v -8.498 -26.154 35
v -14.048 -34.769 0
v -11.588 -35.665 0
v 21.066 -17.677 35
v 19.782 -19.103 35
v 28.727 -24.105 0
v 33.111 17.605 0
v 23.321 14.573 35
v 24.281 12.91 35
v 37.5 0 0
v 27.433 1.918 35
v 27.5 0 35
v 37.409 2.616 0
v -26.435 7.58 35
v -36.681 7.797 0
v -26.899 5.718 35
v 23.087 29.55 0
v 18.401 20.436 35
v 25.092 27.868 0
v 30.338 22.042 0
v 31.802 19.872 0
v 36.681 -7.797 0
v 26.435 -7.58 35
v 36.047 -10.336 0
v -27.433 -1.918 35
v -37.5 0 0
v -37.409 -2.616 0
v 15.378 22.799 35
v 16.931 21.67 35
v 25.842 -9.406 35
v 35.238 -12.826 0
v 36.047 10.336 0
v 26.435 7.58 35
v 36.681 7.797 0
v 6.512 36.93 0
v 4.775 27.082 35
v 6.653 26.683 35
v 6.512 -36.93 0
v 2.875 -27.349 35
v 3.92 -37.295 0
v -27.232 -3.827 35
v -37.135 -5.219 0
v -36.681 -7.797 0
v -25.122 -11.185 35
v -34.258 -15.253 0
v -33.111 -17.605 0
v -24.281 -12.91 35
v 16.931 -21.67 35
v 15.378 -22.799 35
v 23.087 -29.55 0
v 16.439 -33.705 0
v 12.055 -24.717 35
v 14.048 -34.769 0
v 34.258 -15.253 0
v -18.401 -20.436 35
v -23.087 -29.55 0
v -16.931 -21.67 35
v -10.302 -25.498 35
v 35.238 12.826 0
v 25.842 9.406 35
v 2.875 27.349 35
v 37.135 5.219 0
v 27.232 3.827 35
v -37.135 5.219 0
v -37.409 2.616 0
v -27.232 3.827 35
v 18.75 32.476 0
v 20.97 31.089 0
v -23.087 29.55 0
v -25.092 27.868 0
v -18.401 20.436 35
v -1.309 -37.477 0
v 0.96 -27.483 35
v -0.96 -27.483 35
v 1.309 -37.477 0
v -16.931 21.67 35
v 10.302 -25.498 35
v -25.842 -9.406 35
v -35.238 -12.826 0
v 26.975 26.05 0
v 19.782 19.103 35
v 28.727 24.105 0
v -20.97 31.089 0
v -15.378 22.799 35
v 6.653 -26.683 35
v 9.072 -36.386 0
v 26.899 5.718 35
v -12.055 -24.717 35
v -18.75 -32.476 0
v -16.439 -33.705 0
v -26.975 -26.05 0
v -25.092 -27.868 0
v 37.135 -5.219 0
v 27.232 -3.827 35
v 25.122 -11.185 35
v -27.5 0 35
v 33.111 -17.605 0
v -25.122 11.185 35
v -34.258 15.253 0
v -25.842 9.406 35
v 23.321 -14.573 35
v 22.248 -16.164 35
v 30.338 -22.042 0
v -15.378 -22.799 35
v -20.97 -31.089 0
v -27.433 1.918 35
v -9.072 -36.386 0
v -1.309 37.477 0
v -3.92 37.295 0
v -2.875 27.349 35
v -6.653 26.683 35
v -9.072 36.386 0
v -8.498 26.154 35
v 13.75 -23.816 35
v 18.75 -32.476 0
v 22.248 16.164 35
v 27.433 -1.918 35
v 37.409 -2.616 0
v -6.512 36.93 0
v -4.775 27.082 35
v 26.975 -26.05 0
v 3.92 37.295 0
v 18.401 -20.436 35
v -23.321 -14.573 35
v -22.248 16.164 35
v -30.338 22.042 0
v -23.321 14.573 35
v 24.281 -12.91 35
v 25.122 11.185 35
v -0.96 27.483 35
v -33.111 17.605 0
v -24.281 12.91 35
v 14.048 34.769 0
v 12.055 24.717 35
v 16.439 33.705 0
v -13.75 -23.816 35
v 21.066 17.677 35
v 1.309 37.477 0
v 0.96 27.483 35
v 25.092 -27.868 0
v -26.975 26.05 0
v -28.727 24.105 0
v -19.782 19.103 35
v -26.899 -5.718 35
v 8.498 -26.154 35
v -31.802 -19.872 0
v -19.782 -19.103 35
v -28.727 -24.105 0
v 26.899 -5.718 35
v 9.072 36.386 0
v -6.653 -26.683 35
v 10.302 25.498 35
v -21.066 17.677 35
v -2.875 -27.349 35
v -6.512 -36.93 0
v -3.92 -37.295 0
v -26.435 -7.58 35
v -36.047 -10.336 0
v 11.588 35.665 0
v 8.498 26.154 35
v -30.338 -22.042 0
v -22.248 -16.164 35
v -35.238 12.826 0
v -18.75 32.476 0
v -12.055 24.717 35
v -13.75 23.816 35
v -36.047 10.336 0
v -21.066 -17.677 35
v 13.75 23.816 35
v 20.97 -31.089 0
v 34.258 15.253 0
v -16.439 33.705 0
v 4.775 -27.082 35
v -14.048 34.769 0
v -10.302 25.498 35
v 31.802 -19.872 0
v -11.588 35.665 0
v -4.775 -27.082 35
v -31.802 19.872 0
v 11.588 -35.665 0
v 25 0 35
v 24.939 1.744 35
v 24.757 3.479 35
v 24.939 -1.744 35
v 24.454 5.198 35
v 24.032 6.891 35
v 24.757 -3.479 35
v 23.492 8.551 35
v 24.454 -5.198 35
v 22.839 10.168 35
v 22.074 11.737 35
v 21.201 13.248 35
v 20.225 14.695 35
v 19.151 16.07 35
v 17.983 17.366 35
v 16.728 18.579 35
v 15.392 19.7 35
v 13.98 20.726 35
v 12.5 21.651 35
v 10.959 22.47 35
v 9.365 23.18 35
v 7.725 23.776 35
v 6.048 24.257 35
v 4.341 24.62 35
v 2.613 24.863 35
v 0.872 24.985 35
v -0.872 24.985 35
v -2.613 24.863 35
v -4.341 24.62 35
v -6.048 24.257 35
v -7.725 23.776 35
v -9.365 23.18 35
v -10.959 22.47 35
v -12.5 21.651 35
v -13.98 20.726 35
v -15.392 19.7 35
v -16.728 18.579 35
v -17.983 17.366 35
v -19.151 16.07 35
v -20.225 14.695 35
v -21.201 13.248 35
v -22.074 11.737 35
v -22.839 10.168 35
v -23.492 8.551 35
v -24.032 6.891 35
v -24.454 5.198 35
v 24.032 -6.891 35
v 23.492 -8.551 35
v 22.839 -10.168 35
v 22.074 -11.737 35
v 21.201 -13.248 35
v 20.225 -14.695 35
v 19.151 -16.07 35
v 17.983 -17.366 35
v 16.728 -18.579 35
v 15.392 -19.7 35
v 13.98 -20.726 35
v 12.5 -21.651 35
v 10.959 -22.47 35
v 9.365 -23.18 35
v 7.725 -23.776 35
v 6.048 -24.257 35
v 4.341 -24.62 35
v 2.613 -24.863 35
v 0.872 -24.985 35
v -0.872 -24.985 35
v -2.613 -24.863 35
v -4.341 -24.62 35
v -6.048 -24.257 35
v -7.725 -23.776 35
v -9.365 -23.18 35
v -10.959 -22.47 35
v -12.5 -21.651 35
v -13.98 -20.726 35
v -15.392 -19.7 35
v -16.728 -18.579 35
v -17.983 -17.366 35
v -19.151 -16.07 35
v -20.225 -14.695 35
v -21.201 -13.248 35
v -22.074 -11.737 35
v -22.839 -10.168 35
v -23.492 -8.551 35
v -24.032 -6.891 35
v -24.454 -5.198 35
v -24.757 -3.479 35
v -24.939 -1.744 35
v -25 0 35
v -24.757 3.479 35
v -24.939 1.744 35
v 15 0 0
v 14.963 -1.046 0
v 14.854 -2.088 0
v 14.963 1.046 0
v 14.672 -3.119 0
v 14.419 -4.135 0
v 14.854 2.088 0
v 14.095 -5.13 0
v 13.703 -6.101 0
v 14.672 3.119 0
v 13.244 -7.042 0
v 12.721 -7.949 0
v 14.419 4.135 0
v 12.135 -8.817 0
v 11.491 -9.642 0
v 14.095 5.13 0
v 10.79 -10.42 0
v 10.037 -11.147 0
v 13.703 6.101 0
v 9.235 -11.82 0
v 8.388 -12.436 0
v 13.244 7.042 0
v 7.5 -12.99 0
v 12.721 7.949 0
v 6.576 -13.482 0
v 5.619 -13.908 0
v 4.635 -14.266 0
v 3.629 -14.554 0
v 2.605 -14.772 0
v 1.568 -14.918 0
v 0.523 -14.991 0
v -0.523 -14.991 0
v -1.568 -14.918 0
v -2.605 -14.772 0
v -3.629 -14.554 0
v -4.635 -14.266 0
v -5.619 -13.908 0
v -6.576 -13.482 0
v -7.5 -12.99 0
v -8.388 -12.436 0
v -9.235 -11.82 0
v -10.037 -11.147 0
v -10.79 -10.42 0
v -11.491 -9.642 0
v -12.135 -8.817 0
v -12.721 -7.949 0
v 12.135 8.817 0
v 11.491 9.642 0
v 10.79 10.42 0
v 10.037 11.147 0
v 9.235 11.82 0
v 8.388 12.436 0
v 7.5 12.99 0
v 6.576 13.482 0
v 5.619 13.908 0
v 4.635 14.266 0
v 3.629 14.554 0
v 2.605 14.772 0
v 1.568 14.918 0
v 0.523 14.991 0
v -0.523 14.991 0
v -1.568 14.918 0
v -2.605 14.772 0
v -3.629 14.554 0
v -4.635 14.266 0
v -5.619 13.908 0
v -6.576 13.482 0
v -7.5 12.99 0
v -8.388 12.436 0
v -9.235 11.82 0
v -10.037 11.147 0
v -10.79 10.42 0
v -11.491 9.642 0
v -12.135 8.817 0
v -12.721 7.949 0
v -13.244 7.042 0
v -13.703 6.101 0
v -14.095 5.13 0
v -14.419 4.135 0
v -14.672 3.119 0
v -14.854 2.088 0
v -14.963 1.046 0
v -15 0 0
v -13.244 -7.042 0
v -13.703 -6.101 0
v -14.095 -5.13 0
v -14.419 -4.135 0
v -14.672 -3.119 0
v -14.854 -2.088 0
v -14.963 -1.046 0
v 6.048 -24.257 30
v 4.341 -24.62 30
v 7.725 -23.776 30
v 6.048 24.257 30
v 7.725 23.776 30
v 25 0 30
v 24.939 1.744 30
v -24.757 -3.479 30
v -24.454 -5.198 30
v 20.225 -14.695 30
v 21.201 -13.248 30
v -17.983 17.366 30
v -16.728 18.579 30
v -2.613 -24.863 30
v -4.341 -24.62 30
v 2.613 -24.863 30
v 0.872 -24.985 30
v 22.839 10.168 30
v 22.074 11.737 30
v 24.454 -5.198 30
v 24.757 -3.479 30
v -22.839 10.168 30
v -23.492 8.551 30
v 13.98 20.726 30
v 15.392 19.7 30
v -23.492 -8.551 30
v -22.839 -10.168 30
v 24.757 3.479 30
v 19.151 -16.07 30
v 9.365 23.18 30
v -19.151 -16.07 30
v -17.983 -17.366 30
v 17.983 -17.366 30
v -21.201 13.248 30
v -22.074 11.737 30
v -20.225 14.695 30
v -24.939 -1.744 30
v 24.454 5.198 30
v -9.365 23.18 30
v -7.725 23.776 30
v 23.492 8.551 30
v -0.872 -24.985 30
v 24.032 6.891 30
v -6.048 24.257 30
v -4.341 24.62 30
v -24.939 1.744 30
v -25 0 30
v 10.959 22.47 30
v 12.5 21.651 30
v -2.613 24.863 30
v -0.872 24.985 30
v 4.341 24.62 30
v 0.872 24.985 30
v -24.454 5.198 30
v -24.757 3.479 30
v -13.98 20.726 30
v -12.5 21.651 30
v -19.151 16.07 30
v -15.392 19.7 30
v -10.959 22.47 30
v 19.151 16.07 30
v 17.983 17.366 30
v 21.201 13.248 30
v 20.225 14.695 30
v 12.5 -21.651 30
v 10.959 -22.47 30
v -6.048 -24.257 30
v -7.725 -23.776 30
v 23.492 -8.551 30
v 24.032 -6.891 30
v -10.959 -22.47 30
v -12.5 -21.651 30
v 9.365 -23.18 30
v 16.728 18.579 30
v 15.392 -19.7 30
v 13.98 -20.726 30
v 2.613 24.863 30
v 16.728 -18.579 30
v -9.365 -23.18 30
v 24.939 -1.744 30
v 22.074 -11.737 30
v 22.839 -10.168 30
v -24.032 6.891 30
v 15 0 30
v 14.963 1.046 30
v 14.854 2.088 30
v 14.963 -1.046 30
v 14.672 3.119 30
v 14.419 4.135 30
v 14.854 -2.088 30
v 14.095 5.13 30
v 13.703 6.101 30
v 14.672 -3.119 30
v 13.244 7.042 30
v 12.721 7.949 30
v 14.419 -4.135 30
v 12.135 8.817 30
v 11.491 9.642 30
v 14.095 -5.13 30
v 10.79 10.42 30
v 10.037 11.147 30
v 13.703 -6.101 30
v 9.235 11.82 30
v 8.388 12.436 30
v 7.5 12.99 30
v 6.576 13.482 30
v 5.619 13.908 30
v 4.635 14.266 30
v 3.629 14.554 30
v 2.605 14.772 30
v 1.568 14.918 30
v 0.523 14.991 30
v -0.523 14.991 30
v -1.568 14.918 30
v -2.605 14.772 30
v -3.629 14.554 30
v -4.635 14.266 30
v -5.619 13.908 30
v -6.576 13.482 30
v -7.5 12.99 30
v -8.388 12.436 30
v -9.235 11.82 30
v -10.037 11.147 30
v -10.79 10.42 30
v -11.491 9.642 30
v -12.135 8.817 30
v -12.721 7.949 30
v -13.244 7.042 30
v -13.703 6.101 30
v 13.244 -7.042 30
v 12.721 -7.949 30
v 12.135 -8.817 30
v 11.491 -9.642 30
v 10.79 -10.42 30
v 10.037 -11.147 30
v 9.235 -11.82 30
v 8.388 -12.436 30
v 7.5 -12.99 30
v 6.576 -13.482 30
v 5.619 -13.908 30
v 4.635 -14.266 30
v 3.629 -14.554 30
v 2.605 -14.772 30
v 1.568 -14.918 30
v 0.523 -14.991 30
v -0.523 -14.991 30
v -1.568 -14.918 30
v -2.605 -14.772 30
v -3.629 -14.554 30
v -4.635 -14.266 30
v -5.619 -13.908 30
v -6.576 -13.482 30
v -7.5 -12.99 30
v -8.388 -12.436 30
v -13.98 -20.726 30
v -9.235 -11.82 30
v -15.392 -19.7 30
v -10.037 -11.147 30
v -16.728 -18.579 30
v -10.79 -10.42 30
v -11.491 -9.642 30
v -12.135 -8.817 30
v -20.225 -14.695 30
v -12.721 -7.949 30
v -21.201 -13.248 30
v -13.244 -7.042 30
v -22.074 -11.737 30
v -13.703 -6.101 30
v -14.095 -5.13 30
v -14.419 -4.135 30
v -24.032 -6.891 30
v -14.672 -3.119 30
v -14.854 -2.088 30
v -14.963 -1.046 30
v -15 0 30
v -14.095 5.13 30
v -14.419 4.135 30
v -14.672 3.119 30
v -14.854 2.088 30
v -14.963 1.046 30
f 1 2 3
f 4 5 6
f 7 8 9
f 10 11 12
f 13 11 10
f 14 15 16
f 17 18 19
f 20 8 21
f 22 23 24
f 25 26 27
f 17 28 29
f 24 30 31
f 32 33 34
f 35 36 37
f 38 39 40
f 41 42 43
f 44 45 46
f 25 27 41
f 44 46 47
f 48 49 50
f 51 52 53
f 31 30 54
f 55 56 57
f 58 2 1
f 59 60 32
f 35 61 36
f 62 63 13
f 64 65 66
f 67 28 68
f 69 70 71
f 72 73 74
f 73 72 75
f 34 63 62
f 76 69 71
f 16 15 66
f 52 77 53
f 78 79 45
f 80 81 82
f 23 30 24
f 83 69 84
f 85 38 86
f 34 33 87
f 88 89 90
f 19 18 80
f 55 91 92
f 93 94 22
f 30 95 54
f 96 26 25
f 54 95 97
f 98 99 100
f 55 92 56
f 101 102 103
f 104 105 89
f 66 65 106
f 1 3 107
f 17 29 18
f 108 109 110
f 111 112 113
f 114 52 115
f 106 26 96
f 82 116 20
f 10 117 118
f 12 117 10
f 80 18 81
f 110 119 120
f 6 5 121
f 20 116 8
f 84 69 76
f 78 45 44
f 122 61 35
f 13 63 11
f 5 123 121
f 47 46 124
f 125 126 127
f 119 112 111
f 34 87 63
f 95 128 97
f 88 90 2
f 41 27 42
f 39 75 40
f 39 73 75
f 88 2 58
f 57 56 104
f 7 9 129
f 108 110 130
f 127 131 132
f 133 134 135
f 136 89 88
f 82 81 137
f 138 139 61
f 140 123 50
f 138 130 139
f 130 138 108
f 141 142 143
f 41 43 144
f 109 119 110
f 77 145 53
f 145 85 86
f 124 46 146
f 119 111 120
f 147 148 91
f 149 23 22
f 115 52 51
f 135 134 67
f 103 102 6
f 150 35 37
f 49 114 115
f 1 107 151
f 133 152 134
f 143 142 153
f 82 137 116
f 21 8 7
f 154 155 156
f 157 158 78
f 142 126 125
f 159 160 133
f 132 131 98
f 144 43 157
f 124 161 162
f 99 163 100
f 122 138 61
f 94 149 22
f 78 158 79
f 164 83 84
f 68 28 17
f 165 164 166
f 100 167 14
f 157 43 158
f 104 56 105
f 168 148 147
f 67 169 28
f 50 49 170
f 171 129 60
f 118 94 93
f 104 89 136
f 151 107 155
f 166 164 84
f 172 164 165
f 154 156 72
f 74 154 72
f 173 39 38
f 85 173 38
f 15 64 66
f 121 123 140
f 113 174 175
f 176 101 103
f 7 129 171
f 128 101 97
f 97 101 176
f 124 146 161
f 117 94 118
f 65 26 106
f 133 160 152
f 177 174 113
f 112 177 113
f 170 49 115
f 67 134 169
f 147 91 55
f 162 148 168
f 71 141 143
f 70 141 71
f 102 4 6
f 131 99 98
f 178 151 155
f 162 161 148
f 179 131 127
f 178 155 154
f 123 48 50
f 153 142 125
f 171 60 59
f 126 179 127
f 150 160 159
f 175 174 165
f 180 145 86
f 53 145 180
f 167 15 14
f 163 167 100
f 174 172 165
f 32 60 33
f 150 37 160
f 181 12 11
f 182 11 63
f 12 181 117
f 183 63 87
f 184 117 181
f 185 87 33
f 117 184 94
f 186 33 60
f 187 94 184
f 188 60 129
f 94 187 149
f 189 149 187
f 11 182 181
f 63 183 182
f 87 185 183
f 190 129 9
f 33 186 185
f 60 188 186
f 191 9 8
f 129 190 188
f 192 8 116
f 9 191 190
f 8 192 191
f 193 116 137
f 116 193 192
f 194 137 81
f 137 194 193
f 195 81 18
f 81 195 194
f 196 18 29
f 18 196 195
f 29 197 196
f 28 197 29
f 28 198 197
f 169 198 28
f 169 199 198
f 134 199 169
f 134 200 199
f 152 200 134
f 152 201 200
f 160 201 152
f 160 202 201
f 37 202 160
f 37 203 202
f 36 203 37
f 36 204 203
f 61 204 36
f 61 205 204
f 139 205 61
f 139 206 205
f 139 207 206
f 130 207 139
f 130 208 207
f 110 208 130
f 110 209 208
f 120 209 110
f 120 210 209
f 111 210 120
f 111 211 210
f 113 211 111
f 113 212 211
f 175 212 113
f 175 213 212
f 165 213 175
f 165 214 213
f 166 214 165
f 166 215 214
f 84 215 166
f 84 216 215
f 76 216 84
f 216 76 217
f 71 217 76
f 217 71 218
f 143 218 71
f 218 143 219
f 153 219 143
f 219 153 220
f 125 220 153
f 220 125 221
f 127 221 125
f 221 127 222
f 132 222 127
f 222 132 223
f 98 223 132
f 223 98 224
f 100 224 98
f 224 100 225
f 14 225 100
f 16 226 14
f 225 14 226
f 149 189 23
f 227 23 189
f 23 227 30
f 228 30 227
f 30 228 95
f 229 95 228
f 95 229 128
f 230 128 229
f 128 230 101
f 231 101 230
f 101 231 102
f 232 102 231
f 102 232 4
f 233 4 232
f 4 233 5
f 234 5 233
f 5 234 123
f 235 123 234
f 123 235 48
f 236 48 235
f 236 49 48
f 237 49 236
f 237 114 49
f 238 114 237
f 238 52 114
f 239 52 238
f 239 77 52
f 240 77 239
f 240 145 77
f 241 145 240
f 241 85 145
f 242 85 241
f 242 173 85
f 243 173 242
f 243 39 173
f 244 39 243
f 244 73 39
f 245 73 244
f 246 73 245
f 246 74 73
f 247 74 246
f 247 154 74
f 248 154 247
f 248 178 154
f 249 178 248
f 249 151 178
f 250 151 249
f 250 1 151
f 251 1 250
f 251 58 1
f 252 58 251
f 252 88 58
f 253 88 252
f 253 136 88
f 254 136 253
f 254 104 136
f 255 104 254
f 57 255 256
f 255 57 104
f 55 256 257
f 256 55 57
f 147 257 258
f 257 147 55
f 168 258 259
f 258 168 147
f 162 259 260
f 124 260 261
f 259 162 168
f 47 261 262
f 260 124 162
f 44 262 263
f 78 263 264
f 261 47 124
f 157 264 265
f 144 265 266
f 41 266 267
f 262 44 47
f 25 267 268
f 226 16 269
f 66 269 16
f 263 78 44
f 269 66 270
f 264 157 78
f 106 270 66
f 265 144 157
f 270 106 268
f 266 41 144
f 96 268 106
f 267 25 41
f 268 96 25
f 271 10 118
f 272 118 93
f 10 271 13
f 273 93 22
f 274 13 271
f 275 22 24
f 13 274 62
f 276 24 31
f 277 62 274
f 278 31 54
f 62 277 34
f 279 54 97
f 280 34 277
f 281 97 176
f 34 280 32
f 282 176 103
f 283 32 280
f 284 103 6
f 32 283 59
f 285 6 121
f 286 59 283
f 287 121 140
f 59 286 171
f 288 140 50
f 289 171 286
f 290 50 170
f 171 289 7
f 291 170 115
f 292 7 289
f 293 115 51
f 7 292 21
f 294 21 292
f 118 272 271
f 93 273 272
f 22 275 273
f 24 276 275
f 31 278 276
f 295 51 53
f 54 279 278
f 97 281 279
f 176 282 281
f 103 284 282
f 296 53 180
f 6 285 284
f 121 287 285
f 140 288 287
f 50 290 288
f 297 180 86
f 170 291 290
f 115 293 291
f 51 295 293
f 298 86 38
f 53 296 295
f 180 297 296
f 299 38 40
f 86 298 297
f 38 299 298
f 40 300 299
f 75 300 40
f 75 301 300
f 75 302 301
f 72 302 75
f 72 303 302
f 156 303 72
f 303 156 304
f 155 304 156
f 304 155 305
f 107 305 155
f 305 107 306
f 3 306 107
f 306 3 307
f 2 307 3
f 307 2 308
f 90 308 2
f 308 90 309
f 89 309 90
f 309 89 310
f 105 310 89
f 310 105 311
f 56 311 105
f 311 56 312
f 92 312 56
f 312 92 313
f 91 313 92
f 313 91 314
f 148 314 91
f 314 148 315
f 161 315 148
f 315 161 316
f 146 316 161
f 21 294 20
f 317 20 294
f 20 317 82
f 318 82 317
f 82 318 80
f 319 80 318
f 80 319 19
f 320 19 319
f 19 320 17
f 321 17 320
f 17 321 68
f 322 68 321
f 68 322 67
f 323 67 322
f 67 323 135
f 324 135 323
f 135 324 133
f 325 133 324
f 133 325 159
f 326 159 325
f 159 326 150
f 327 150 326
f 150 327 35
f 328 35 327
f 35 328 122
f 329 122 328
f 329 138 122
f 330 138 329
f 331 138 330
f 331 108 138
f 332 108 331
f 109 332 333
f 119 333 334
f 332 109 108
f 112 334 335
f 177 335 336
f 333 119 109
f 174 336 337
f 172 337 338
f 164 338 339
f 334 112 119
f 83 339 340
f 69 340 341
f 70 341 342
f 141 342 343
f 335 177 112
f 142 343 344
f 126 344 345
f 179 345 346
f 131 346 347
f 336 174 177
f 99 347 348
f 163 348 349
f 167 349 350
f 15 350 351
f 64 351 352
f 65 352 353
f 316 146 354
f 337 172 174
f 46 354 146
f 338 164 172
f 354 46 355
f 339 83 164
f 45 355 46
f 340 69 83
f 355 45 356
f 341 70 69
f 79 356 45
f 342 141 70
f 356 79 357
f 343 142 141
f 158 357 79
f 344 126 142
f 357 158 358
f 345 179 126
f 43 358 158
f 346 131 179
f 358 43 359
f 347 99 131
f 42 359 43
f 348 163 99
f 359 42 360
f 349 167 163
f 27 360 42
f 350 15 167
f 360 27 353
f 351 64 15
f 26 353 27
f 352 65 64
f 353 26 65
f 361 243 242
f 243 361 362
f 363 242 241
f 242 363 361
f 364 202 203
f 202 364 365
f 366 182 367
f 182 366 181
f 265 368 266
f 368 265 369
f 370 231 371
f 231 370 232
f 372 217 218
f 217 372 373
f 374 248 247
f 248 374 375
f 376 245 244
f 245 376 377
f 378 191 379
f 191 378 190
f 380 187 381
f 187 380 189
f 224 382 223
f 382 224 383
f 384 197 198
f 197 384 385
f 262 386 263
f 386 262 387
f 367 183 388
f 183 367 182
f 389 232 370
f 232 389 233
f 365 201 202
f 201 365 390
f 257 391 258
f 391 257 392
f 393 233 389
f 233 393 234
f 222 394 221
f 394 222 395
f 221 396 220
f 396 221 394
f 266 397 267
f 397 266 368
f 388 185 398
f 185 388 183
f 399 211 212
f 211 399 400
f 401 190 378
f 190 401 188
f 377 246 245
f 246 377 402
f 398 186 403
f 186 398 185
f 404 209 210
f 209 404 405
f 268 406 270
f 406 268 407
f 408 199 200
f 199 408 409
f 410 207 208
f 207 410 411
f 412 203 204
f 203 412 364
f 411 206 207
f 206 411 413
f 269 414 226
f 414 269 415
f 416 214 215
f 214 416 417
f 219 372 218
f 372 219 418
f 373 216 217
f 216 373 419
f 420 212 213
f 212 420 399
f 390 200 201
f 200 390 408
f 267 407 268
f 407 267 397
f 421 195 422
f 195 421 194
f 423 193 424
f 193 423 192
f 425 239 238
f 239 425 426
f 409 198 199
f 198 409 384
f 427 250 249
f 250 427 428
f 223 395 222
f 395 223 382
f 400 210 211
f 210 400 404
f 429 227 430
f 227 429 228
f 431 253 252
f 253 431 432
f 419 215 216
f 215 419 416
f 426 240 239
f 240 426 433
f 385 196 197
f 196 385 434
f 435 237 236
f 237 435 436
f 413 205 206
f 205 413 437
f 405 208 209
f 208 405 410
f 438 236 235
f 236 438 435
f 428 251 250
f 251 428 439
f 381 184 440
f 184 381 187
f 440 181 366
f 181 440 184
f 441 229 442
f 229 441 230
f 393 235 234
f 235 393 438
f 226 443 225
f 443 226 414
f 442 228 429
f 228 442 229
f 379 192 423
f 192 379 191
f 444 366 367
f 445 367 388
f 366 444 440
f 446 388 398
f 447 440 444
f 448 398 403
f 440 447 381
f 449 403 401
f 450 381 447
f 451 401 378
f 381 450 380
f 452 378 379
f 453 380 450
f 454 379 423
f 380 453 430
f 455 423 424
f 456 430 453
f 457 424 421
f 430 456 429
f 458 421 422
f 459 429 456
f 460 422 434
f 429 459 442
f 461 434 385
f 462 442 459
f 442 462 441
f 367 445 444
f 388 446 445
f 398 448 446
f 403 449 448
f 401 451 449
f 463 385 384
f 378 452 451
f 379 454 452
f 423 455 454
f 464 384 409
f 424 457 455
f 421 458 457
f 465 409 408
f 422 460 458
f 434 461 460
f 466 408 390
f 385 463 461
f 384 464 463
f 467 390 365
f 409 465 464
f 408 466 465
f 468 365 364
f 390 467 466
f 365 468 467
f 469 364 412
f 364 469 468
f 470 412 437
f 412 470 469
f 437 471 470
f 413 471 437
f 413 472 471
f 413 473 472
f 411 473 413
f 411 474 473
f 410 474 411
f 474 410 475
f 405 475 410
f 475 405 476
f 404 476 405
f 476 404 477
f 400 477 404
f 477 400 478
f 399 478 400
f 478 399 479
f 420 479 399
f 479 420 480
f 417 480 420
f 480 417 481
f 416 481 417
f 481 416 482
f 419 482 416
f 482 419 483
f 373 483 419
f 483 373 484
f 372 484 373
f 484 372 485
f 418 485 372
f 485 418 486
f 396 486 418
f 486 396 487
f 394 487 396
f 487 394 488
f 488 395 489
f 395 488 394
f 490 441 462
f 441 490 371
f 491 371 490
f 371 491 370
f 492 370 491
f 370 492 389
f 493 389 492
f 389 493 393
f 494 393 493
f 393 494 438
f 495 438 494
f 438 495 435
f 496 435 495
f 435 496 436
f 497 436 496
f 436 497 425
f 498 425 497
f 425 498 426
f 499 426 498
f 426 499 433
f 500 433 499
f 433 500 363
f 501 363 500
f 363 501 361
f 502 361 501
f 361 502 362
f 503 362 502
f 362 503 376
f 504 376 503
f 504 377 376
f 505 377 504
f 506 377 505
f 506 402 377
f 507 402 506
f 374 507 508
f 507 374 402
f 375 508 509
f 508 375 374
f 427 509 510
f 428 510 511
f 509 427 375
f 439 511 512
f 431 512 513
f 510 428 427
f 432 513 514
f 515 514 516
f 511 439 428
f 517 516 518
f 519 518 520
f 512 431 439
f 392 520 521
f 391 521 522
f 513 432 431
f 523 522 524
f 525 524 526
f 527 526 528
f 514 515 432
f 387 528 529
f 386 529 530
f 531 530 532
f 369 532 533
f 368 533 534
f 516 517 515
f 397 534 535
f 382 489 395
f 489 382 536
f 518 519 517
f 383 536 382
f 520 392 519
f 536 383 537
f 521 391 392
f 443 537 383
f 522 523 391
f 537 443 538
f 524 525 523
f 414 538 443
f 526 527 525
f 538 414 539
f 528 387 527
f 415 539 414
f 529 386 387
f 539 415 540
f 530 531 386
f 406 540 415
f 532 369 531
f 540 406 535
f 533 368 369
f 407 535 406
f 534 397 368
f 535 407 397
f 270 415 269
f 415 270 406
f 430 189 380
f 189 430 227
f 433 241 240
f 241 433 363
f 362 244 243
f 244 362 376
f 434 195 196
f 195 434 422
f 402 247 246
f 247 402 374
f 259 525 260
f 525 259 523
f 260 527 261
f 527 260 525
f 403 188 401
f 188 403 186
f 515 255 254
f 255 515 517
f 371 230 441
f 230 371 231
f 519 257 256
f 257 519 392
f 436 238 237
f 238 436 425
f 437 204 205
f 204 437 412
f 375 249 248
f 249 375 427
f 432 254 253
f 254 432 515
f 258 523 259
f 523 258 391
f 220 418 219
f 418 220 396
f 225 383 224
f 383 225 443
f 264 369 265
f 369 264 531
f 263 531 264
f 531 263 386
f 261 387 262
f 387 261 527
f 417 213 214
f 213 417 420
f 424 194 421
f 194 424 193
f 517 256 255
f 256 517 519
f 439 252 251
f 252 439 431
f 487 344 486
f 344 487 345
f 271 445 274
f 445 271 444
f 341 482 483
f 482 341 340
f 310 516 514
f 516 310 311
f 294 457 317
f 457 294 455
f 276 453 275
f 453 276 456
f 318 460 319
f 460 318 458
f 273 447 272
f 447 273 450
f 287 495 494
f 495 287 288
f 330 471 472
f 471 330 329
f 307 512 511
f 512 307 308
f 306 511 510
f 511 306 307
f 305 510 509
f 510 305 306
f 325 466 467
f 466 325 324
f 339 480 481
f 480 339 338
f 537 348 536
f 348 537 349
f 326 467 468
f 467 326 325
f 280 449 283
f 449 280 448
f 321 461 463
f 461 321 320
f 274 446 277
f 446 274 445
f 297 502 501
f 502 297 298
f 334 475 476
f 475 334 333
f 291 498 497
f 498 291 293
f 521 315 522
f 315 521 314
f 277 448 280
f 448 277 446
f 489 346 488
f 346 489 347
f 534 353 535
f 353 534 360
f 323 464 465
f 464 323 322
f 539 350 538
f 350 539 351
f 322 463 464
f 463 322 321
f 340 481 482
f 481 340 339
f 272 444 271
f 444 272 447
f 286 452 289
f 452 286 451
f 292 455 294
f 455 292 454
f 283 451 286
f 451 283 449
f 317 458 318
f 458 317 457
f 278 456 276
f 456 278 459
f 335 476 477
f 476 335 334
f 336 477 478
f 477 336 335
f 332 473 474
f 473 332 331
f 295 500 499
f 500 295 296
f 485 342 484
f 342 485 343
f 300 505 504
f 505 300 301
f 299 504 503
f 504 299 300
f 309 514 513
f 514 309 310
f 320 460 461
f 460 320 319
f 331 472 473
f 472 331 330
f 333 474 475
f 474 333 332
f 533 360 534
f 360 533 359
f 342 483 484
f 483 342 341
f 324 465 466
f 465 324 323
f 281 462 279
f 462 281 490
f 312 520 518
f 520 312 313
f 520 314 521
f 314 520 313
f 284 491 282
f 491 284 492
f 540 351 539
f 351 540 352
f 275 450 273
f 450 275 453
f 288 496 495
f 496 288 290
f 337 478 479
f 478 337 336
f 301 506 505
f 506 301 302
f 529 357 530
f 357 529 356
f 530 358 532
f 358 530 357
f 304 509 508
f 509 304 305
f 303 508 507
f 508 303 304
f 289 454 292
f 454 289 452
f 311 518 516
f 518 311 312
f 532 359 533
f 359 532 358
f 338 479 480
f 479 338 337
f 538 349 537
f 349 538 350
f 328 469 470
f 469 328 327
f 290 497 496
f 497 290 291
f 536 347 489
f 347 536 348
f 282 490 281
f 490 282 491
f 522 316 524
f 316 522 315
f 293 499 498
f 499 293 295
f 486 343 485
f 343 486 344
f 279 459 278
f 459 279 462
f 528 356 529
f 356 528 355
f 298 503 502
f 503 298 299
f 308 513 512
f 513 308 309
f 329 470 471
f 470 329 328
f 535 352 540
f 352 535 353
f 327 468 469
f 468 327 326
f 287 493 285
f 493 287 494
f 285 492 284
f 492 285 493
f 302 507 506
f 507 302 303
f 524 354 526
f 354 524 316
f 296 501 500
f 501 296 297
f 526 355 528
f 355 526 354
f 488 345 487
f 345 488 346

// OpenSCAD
$fa=4; // default minimum facet angle is now 0.5
$fs=0.05; // default minimum facet size is now 0.05 mm

difference() {
  cylinder(h = 35, r1 = 75/2, r2 = 55/2);
  translate([0, 0, 30]) cylinder(h = 15, r = 50/2); 
  translate([0, 0, -1]) cylinder(h = 50, r = 30/2);
}
